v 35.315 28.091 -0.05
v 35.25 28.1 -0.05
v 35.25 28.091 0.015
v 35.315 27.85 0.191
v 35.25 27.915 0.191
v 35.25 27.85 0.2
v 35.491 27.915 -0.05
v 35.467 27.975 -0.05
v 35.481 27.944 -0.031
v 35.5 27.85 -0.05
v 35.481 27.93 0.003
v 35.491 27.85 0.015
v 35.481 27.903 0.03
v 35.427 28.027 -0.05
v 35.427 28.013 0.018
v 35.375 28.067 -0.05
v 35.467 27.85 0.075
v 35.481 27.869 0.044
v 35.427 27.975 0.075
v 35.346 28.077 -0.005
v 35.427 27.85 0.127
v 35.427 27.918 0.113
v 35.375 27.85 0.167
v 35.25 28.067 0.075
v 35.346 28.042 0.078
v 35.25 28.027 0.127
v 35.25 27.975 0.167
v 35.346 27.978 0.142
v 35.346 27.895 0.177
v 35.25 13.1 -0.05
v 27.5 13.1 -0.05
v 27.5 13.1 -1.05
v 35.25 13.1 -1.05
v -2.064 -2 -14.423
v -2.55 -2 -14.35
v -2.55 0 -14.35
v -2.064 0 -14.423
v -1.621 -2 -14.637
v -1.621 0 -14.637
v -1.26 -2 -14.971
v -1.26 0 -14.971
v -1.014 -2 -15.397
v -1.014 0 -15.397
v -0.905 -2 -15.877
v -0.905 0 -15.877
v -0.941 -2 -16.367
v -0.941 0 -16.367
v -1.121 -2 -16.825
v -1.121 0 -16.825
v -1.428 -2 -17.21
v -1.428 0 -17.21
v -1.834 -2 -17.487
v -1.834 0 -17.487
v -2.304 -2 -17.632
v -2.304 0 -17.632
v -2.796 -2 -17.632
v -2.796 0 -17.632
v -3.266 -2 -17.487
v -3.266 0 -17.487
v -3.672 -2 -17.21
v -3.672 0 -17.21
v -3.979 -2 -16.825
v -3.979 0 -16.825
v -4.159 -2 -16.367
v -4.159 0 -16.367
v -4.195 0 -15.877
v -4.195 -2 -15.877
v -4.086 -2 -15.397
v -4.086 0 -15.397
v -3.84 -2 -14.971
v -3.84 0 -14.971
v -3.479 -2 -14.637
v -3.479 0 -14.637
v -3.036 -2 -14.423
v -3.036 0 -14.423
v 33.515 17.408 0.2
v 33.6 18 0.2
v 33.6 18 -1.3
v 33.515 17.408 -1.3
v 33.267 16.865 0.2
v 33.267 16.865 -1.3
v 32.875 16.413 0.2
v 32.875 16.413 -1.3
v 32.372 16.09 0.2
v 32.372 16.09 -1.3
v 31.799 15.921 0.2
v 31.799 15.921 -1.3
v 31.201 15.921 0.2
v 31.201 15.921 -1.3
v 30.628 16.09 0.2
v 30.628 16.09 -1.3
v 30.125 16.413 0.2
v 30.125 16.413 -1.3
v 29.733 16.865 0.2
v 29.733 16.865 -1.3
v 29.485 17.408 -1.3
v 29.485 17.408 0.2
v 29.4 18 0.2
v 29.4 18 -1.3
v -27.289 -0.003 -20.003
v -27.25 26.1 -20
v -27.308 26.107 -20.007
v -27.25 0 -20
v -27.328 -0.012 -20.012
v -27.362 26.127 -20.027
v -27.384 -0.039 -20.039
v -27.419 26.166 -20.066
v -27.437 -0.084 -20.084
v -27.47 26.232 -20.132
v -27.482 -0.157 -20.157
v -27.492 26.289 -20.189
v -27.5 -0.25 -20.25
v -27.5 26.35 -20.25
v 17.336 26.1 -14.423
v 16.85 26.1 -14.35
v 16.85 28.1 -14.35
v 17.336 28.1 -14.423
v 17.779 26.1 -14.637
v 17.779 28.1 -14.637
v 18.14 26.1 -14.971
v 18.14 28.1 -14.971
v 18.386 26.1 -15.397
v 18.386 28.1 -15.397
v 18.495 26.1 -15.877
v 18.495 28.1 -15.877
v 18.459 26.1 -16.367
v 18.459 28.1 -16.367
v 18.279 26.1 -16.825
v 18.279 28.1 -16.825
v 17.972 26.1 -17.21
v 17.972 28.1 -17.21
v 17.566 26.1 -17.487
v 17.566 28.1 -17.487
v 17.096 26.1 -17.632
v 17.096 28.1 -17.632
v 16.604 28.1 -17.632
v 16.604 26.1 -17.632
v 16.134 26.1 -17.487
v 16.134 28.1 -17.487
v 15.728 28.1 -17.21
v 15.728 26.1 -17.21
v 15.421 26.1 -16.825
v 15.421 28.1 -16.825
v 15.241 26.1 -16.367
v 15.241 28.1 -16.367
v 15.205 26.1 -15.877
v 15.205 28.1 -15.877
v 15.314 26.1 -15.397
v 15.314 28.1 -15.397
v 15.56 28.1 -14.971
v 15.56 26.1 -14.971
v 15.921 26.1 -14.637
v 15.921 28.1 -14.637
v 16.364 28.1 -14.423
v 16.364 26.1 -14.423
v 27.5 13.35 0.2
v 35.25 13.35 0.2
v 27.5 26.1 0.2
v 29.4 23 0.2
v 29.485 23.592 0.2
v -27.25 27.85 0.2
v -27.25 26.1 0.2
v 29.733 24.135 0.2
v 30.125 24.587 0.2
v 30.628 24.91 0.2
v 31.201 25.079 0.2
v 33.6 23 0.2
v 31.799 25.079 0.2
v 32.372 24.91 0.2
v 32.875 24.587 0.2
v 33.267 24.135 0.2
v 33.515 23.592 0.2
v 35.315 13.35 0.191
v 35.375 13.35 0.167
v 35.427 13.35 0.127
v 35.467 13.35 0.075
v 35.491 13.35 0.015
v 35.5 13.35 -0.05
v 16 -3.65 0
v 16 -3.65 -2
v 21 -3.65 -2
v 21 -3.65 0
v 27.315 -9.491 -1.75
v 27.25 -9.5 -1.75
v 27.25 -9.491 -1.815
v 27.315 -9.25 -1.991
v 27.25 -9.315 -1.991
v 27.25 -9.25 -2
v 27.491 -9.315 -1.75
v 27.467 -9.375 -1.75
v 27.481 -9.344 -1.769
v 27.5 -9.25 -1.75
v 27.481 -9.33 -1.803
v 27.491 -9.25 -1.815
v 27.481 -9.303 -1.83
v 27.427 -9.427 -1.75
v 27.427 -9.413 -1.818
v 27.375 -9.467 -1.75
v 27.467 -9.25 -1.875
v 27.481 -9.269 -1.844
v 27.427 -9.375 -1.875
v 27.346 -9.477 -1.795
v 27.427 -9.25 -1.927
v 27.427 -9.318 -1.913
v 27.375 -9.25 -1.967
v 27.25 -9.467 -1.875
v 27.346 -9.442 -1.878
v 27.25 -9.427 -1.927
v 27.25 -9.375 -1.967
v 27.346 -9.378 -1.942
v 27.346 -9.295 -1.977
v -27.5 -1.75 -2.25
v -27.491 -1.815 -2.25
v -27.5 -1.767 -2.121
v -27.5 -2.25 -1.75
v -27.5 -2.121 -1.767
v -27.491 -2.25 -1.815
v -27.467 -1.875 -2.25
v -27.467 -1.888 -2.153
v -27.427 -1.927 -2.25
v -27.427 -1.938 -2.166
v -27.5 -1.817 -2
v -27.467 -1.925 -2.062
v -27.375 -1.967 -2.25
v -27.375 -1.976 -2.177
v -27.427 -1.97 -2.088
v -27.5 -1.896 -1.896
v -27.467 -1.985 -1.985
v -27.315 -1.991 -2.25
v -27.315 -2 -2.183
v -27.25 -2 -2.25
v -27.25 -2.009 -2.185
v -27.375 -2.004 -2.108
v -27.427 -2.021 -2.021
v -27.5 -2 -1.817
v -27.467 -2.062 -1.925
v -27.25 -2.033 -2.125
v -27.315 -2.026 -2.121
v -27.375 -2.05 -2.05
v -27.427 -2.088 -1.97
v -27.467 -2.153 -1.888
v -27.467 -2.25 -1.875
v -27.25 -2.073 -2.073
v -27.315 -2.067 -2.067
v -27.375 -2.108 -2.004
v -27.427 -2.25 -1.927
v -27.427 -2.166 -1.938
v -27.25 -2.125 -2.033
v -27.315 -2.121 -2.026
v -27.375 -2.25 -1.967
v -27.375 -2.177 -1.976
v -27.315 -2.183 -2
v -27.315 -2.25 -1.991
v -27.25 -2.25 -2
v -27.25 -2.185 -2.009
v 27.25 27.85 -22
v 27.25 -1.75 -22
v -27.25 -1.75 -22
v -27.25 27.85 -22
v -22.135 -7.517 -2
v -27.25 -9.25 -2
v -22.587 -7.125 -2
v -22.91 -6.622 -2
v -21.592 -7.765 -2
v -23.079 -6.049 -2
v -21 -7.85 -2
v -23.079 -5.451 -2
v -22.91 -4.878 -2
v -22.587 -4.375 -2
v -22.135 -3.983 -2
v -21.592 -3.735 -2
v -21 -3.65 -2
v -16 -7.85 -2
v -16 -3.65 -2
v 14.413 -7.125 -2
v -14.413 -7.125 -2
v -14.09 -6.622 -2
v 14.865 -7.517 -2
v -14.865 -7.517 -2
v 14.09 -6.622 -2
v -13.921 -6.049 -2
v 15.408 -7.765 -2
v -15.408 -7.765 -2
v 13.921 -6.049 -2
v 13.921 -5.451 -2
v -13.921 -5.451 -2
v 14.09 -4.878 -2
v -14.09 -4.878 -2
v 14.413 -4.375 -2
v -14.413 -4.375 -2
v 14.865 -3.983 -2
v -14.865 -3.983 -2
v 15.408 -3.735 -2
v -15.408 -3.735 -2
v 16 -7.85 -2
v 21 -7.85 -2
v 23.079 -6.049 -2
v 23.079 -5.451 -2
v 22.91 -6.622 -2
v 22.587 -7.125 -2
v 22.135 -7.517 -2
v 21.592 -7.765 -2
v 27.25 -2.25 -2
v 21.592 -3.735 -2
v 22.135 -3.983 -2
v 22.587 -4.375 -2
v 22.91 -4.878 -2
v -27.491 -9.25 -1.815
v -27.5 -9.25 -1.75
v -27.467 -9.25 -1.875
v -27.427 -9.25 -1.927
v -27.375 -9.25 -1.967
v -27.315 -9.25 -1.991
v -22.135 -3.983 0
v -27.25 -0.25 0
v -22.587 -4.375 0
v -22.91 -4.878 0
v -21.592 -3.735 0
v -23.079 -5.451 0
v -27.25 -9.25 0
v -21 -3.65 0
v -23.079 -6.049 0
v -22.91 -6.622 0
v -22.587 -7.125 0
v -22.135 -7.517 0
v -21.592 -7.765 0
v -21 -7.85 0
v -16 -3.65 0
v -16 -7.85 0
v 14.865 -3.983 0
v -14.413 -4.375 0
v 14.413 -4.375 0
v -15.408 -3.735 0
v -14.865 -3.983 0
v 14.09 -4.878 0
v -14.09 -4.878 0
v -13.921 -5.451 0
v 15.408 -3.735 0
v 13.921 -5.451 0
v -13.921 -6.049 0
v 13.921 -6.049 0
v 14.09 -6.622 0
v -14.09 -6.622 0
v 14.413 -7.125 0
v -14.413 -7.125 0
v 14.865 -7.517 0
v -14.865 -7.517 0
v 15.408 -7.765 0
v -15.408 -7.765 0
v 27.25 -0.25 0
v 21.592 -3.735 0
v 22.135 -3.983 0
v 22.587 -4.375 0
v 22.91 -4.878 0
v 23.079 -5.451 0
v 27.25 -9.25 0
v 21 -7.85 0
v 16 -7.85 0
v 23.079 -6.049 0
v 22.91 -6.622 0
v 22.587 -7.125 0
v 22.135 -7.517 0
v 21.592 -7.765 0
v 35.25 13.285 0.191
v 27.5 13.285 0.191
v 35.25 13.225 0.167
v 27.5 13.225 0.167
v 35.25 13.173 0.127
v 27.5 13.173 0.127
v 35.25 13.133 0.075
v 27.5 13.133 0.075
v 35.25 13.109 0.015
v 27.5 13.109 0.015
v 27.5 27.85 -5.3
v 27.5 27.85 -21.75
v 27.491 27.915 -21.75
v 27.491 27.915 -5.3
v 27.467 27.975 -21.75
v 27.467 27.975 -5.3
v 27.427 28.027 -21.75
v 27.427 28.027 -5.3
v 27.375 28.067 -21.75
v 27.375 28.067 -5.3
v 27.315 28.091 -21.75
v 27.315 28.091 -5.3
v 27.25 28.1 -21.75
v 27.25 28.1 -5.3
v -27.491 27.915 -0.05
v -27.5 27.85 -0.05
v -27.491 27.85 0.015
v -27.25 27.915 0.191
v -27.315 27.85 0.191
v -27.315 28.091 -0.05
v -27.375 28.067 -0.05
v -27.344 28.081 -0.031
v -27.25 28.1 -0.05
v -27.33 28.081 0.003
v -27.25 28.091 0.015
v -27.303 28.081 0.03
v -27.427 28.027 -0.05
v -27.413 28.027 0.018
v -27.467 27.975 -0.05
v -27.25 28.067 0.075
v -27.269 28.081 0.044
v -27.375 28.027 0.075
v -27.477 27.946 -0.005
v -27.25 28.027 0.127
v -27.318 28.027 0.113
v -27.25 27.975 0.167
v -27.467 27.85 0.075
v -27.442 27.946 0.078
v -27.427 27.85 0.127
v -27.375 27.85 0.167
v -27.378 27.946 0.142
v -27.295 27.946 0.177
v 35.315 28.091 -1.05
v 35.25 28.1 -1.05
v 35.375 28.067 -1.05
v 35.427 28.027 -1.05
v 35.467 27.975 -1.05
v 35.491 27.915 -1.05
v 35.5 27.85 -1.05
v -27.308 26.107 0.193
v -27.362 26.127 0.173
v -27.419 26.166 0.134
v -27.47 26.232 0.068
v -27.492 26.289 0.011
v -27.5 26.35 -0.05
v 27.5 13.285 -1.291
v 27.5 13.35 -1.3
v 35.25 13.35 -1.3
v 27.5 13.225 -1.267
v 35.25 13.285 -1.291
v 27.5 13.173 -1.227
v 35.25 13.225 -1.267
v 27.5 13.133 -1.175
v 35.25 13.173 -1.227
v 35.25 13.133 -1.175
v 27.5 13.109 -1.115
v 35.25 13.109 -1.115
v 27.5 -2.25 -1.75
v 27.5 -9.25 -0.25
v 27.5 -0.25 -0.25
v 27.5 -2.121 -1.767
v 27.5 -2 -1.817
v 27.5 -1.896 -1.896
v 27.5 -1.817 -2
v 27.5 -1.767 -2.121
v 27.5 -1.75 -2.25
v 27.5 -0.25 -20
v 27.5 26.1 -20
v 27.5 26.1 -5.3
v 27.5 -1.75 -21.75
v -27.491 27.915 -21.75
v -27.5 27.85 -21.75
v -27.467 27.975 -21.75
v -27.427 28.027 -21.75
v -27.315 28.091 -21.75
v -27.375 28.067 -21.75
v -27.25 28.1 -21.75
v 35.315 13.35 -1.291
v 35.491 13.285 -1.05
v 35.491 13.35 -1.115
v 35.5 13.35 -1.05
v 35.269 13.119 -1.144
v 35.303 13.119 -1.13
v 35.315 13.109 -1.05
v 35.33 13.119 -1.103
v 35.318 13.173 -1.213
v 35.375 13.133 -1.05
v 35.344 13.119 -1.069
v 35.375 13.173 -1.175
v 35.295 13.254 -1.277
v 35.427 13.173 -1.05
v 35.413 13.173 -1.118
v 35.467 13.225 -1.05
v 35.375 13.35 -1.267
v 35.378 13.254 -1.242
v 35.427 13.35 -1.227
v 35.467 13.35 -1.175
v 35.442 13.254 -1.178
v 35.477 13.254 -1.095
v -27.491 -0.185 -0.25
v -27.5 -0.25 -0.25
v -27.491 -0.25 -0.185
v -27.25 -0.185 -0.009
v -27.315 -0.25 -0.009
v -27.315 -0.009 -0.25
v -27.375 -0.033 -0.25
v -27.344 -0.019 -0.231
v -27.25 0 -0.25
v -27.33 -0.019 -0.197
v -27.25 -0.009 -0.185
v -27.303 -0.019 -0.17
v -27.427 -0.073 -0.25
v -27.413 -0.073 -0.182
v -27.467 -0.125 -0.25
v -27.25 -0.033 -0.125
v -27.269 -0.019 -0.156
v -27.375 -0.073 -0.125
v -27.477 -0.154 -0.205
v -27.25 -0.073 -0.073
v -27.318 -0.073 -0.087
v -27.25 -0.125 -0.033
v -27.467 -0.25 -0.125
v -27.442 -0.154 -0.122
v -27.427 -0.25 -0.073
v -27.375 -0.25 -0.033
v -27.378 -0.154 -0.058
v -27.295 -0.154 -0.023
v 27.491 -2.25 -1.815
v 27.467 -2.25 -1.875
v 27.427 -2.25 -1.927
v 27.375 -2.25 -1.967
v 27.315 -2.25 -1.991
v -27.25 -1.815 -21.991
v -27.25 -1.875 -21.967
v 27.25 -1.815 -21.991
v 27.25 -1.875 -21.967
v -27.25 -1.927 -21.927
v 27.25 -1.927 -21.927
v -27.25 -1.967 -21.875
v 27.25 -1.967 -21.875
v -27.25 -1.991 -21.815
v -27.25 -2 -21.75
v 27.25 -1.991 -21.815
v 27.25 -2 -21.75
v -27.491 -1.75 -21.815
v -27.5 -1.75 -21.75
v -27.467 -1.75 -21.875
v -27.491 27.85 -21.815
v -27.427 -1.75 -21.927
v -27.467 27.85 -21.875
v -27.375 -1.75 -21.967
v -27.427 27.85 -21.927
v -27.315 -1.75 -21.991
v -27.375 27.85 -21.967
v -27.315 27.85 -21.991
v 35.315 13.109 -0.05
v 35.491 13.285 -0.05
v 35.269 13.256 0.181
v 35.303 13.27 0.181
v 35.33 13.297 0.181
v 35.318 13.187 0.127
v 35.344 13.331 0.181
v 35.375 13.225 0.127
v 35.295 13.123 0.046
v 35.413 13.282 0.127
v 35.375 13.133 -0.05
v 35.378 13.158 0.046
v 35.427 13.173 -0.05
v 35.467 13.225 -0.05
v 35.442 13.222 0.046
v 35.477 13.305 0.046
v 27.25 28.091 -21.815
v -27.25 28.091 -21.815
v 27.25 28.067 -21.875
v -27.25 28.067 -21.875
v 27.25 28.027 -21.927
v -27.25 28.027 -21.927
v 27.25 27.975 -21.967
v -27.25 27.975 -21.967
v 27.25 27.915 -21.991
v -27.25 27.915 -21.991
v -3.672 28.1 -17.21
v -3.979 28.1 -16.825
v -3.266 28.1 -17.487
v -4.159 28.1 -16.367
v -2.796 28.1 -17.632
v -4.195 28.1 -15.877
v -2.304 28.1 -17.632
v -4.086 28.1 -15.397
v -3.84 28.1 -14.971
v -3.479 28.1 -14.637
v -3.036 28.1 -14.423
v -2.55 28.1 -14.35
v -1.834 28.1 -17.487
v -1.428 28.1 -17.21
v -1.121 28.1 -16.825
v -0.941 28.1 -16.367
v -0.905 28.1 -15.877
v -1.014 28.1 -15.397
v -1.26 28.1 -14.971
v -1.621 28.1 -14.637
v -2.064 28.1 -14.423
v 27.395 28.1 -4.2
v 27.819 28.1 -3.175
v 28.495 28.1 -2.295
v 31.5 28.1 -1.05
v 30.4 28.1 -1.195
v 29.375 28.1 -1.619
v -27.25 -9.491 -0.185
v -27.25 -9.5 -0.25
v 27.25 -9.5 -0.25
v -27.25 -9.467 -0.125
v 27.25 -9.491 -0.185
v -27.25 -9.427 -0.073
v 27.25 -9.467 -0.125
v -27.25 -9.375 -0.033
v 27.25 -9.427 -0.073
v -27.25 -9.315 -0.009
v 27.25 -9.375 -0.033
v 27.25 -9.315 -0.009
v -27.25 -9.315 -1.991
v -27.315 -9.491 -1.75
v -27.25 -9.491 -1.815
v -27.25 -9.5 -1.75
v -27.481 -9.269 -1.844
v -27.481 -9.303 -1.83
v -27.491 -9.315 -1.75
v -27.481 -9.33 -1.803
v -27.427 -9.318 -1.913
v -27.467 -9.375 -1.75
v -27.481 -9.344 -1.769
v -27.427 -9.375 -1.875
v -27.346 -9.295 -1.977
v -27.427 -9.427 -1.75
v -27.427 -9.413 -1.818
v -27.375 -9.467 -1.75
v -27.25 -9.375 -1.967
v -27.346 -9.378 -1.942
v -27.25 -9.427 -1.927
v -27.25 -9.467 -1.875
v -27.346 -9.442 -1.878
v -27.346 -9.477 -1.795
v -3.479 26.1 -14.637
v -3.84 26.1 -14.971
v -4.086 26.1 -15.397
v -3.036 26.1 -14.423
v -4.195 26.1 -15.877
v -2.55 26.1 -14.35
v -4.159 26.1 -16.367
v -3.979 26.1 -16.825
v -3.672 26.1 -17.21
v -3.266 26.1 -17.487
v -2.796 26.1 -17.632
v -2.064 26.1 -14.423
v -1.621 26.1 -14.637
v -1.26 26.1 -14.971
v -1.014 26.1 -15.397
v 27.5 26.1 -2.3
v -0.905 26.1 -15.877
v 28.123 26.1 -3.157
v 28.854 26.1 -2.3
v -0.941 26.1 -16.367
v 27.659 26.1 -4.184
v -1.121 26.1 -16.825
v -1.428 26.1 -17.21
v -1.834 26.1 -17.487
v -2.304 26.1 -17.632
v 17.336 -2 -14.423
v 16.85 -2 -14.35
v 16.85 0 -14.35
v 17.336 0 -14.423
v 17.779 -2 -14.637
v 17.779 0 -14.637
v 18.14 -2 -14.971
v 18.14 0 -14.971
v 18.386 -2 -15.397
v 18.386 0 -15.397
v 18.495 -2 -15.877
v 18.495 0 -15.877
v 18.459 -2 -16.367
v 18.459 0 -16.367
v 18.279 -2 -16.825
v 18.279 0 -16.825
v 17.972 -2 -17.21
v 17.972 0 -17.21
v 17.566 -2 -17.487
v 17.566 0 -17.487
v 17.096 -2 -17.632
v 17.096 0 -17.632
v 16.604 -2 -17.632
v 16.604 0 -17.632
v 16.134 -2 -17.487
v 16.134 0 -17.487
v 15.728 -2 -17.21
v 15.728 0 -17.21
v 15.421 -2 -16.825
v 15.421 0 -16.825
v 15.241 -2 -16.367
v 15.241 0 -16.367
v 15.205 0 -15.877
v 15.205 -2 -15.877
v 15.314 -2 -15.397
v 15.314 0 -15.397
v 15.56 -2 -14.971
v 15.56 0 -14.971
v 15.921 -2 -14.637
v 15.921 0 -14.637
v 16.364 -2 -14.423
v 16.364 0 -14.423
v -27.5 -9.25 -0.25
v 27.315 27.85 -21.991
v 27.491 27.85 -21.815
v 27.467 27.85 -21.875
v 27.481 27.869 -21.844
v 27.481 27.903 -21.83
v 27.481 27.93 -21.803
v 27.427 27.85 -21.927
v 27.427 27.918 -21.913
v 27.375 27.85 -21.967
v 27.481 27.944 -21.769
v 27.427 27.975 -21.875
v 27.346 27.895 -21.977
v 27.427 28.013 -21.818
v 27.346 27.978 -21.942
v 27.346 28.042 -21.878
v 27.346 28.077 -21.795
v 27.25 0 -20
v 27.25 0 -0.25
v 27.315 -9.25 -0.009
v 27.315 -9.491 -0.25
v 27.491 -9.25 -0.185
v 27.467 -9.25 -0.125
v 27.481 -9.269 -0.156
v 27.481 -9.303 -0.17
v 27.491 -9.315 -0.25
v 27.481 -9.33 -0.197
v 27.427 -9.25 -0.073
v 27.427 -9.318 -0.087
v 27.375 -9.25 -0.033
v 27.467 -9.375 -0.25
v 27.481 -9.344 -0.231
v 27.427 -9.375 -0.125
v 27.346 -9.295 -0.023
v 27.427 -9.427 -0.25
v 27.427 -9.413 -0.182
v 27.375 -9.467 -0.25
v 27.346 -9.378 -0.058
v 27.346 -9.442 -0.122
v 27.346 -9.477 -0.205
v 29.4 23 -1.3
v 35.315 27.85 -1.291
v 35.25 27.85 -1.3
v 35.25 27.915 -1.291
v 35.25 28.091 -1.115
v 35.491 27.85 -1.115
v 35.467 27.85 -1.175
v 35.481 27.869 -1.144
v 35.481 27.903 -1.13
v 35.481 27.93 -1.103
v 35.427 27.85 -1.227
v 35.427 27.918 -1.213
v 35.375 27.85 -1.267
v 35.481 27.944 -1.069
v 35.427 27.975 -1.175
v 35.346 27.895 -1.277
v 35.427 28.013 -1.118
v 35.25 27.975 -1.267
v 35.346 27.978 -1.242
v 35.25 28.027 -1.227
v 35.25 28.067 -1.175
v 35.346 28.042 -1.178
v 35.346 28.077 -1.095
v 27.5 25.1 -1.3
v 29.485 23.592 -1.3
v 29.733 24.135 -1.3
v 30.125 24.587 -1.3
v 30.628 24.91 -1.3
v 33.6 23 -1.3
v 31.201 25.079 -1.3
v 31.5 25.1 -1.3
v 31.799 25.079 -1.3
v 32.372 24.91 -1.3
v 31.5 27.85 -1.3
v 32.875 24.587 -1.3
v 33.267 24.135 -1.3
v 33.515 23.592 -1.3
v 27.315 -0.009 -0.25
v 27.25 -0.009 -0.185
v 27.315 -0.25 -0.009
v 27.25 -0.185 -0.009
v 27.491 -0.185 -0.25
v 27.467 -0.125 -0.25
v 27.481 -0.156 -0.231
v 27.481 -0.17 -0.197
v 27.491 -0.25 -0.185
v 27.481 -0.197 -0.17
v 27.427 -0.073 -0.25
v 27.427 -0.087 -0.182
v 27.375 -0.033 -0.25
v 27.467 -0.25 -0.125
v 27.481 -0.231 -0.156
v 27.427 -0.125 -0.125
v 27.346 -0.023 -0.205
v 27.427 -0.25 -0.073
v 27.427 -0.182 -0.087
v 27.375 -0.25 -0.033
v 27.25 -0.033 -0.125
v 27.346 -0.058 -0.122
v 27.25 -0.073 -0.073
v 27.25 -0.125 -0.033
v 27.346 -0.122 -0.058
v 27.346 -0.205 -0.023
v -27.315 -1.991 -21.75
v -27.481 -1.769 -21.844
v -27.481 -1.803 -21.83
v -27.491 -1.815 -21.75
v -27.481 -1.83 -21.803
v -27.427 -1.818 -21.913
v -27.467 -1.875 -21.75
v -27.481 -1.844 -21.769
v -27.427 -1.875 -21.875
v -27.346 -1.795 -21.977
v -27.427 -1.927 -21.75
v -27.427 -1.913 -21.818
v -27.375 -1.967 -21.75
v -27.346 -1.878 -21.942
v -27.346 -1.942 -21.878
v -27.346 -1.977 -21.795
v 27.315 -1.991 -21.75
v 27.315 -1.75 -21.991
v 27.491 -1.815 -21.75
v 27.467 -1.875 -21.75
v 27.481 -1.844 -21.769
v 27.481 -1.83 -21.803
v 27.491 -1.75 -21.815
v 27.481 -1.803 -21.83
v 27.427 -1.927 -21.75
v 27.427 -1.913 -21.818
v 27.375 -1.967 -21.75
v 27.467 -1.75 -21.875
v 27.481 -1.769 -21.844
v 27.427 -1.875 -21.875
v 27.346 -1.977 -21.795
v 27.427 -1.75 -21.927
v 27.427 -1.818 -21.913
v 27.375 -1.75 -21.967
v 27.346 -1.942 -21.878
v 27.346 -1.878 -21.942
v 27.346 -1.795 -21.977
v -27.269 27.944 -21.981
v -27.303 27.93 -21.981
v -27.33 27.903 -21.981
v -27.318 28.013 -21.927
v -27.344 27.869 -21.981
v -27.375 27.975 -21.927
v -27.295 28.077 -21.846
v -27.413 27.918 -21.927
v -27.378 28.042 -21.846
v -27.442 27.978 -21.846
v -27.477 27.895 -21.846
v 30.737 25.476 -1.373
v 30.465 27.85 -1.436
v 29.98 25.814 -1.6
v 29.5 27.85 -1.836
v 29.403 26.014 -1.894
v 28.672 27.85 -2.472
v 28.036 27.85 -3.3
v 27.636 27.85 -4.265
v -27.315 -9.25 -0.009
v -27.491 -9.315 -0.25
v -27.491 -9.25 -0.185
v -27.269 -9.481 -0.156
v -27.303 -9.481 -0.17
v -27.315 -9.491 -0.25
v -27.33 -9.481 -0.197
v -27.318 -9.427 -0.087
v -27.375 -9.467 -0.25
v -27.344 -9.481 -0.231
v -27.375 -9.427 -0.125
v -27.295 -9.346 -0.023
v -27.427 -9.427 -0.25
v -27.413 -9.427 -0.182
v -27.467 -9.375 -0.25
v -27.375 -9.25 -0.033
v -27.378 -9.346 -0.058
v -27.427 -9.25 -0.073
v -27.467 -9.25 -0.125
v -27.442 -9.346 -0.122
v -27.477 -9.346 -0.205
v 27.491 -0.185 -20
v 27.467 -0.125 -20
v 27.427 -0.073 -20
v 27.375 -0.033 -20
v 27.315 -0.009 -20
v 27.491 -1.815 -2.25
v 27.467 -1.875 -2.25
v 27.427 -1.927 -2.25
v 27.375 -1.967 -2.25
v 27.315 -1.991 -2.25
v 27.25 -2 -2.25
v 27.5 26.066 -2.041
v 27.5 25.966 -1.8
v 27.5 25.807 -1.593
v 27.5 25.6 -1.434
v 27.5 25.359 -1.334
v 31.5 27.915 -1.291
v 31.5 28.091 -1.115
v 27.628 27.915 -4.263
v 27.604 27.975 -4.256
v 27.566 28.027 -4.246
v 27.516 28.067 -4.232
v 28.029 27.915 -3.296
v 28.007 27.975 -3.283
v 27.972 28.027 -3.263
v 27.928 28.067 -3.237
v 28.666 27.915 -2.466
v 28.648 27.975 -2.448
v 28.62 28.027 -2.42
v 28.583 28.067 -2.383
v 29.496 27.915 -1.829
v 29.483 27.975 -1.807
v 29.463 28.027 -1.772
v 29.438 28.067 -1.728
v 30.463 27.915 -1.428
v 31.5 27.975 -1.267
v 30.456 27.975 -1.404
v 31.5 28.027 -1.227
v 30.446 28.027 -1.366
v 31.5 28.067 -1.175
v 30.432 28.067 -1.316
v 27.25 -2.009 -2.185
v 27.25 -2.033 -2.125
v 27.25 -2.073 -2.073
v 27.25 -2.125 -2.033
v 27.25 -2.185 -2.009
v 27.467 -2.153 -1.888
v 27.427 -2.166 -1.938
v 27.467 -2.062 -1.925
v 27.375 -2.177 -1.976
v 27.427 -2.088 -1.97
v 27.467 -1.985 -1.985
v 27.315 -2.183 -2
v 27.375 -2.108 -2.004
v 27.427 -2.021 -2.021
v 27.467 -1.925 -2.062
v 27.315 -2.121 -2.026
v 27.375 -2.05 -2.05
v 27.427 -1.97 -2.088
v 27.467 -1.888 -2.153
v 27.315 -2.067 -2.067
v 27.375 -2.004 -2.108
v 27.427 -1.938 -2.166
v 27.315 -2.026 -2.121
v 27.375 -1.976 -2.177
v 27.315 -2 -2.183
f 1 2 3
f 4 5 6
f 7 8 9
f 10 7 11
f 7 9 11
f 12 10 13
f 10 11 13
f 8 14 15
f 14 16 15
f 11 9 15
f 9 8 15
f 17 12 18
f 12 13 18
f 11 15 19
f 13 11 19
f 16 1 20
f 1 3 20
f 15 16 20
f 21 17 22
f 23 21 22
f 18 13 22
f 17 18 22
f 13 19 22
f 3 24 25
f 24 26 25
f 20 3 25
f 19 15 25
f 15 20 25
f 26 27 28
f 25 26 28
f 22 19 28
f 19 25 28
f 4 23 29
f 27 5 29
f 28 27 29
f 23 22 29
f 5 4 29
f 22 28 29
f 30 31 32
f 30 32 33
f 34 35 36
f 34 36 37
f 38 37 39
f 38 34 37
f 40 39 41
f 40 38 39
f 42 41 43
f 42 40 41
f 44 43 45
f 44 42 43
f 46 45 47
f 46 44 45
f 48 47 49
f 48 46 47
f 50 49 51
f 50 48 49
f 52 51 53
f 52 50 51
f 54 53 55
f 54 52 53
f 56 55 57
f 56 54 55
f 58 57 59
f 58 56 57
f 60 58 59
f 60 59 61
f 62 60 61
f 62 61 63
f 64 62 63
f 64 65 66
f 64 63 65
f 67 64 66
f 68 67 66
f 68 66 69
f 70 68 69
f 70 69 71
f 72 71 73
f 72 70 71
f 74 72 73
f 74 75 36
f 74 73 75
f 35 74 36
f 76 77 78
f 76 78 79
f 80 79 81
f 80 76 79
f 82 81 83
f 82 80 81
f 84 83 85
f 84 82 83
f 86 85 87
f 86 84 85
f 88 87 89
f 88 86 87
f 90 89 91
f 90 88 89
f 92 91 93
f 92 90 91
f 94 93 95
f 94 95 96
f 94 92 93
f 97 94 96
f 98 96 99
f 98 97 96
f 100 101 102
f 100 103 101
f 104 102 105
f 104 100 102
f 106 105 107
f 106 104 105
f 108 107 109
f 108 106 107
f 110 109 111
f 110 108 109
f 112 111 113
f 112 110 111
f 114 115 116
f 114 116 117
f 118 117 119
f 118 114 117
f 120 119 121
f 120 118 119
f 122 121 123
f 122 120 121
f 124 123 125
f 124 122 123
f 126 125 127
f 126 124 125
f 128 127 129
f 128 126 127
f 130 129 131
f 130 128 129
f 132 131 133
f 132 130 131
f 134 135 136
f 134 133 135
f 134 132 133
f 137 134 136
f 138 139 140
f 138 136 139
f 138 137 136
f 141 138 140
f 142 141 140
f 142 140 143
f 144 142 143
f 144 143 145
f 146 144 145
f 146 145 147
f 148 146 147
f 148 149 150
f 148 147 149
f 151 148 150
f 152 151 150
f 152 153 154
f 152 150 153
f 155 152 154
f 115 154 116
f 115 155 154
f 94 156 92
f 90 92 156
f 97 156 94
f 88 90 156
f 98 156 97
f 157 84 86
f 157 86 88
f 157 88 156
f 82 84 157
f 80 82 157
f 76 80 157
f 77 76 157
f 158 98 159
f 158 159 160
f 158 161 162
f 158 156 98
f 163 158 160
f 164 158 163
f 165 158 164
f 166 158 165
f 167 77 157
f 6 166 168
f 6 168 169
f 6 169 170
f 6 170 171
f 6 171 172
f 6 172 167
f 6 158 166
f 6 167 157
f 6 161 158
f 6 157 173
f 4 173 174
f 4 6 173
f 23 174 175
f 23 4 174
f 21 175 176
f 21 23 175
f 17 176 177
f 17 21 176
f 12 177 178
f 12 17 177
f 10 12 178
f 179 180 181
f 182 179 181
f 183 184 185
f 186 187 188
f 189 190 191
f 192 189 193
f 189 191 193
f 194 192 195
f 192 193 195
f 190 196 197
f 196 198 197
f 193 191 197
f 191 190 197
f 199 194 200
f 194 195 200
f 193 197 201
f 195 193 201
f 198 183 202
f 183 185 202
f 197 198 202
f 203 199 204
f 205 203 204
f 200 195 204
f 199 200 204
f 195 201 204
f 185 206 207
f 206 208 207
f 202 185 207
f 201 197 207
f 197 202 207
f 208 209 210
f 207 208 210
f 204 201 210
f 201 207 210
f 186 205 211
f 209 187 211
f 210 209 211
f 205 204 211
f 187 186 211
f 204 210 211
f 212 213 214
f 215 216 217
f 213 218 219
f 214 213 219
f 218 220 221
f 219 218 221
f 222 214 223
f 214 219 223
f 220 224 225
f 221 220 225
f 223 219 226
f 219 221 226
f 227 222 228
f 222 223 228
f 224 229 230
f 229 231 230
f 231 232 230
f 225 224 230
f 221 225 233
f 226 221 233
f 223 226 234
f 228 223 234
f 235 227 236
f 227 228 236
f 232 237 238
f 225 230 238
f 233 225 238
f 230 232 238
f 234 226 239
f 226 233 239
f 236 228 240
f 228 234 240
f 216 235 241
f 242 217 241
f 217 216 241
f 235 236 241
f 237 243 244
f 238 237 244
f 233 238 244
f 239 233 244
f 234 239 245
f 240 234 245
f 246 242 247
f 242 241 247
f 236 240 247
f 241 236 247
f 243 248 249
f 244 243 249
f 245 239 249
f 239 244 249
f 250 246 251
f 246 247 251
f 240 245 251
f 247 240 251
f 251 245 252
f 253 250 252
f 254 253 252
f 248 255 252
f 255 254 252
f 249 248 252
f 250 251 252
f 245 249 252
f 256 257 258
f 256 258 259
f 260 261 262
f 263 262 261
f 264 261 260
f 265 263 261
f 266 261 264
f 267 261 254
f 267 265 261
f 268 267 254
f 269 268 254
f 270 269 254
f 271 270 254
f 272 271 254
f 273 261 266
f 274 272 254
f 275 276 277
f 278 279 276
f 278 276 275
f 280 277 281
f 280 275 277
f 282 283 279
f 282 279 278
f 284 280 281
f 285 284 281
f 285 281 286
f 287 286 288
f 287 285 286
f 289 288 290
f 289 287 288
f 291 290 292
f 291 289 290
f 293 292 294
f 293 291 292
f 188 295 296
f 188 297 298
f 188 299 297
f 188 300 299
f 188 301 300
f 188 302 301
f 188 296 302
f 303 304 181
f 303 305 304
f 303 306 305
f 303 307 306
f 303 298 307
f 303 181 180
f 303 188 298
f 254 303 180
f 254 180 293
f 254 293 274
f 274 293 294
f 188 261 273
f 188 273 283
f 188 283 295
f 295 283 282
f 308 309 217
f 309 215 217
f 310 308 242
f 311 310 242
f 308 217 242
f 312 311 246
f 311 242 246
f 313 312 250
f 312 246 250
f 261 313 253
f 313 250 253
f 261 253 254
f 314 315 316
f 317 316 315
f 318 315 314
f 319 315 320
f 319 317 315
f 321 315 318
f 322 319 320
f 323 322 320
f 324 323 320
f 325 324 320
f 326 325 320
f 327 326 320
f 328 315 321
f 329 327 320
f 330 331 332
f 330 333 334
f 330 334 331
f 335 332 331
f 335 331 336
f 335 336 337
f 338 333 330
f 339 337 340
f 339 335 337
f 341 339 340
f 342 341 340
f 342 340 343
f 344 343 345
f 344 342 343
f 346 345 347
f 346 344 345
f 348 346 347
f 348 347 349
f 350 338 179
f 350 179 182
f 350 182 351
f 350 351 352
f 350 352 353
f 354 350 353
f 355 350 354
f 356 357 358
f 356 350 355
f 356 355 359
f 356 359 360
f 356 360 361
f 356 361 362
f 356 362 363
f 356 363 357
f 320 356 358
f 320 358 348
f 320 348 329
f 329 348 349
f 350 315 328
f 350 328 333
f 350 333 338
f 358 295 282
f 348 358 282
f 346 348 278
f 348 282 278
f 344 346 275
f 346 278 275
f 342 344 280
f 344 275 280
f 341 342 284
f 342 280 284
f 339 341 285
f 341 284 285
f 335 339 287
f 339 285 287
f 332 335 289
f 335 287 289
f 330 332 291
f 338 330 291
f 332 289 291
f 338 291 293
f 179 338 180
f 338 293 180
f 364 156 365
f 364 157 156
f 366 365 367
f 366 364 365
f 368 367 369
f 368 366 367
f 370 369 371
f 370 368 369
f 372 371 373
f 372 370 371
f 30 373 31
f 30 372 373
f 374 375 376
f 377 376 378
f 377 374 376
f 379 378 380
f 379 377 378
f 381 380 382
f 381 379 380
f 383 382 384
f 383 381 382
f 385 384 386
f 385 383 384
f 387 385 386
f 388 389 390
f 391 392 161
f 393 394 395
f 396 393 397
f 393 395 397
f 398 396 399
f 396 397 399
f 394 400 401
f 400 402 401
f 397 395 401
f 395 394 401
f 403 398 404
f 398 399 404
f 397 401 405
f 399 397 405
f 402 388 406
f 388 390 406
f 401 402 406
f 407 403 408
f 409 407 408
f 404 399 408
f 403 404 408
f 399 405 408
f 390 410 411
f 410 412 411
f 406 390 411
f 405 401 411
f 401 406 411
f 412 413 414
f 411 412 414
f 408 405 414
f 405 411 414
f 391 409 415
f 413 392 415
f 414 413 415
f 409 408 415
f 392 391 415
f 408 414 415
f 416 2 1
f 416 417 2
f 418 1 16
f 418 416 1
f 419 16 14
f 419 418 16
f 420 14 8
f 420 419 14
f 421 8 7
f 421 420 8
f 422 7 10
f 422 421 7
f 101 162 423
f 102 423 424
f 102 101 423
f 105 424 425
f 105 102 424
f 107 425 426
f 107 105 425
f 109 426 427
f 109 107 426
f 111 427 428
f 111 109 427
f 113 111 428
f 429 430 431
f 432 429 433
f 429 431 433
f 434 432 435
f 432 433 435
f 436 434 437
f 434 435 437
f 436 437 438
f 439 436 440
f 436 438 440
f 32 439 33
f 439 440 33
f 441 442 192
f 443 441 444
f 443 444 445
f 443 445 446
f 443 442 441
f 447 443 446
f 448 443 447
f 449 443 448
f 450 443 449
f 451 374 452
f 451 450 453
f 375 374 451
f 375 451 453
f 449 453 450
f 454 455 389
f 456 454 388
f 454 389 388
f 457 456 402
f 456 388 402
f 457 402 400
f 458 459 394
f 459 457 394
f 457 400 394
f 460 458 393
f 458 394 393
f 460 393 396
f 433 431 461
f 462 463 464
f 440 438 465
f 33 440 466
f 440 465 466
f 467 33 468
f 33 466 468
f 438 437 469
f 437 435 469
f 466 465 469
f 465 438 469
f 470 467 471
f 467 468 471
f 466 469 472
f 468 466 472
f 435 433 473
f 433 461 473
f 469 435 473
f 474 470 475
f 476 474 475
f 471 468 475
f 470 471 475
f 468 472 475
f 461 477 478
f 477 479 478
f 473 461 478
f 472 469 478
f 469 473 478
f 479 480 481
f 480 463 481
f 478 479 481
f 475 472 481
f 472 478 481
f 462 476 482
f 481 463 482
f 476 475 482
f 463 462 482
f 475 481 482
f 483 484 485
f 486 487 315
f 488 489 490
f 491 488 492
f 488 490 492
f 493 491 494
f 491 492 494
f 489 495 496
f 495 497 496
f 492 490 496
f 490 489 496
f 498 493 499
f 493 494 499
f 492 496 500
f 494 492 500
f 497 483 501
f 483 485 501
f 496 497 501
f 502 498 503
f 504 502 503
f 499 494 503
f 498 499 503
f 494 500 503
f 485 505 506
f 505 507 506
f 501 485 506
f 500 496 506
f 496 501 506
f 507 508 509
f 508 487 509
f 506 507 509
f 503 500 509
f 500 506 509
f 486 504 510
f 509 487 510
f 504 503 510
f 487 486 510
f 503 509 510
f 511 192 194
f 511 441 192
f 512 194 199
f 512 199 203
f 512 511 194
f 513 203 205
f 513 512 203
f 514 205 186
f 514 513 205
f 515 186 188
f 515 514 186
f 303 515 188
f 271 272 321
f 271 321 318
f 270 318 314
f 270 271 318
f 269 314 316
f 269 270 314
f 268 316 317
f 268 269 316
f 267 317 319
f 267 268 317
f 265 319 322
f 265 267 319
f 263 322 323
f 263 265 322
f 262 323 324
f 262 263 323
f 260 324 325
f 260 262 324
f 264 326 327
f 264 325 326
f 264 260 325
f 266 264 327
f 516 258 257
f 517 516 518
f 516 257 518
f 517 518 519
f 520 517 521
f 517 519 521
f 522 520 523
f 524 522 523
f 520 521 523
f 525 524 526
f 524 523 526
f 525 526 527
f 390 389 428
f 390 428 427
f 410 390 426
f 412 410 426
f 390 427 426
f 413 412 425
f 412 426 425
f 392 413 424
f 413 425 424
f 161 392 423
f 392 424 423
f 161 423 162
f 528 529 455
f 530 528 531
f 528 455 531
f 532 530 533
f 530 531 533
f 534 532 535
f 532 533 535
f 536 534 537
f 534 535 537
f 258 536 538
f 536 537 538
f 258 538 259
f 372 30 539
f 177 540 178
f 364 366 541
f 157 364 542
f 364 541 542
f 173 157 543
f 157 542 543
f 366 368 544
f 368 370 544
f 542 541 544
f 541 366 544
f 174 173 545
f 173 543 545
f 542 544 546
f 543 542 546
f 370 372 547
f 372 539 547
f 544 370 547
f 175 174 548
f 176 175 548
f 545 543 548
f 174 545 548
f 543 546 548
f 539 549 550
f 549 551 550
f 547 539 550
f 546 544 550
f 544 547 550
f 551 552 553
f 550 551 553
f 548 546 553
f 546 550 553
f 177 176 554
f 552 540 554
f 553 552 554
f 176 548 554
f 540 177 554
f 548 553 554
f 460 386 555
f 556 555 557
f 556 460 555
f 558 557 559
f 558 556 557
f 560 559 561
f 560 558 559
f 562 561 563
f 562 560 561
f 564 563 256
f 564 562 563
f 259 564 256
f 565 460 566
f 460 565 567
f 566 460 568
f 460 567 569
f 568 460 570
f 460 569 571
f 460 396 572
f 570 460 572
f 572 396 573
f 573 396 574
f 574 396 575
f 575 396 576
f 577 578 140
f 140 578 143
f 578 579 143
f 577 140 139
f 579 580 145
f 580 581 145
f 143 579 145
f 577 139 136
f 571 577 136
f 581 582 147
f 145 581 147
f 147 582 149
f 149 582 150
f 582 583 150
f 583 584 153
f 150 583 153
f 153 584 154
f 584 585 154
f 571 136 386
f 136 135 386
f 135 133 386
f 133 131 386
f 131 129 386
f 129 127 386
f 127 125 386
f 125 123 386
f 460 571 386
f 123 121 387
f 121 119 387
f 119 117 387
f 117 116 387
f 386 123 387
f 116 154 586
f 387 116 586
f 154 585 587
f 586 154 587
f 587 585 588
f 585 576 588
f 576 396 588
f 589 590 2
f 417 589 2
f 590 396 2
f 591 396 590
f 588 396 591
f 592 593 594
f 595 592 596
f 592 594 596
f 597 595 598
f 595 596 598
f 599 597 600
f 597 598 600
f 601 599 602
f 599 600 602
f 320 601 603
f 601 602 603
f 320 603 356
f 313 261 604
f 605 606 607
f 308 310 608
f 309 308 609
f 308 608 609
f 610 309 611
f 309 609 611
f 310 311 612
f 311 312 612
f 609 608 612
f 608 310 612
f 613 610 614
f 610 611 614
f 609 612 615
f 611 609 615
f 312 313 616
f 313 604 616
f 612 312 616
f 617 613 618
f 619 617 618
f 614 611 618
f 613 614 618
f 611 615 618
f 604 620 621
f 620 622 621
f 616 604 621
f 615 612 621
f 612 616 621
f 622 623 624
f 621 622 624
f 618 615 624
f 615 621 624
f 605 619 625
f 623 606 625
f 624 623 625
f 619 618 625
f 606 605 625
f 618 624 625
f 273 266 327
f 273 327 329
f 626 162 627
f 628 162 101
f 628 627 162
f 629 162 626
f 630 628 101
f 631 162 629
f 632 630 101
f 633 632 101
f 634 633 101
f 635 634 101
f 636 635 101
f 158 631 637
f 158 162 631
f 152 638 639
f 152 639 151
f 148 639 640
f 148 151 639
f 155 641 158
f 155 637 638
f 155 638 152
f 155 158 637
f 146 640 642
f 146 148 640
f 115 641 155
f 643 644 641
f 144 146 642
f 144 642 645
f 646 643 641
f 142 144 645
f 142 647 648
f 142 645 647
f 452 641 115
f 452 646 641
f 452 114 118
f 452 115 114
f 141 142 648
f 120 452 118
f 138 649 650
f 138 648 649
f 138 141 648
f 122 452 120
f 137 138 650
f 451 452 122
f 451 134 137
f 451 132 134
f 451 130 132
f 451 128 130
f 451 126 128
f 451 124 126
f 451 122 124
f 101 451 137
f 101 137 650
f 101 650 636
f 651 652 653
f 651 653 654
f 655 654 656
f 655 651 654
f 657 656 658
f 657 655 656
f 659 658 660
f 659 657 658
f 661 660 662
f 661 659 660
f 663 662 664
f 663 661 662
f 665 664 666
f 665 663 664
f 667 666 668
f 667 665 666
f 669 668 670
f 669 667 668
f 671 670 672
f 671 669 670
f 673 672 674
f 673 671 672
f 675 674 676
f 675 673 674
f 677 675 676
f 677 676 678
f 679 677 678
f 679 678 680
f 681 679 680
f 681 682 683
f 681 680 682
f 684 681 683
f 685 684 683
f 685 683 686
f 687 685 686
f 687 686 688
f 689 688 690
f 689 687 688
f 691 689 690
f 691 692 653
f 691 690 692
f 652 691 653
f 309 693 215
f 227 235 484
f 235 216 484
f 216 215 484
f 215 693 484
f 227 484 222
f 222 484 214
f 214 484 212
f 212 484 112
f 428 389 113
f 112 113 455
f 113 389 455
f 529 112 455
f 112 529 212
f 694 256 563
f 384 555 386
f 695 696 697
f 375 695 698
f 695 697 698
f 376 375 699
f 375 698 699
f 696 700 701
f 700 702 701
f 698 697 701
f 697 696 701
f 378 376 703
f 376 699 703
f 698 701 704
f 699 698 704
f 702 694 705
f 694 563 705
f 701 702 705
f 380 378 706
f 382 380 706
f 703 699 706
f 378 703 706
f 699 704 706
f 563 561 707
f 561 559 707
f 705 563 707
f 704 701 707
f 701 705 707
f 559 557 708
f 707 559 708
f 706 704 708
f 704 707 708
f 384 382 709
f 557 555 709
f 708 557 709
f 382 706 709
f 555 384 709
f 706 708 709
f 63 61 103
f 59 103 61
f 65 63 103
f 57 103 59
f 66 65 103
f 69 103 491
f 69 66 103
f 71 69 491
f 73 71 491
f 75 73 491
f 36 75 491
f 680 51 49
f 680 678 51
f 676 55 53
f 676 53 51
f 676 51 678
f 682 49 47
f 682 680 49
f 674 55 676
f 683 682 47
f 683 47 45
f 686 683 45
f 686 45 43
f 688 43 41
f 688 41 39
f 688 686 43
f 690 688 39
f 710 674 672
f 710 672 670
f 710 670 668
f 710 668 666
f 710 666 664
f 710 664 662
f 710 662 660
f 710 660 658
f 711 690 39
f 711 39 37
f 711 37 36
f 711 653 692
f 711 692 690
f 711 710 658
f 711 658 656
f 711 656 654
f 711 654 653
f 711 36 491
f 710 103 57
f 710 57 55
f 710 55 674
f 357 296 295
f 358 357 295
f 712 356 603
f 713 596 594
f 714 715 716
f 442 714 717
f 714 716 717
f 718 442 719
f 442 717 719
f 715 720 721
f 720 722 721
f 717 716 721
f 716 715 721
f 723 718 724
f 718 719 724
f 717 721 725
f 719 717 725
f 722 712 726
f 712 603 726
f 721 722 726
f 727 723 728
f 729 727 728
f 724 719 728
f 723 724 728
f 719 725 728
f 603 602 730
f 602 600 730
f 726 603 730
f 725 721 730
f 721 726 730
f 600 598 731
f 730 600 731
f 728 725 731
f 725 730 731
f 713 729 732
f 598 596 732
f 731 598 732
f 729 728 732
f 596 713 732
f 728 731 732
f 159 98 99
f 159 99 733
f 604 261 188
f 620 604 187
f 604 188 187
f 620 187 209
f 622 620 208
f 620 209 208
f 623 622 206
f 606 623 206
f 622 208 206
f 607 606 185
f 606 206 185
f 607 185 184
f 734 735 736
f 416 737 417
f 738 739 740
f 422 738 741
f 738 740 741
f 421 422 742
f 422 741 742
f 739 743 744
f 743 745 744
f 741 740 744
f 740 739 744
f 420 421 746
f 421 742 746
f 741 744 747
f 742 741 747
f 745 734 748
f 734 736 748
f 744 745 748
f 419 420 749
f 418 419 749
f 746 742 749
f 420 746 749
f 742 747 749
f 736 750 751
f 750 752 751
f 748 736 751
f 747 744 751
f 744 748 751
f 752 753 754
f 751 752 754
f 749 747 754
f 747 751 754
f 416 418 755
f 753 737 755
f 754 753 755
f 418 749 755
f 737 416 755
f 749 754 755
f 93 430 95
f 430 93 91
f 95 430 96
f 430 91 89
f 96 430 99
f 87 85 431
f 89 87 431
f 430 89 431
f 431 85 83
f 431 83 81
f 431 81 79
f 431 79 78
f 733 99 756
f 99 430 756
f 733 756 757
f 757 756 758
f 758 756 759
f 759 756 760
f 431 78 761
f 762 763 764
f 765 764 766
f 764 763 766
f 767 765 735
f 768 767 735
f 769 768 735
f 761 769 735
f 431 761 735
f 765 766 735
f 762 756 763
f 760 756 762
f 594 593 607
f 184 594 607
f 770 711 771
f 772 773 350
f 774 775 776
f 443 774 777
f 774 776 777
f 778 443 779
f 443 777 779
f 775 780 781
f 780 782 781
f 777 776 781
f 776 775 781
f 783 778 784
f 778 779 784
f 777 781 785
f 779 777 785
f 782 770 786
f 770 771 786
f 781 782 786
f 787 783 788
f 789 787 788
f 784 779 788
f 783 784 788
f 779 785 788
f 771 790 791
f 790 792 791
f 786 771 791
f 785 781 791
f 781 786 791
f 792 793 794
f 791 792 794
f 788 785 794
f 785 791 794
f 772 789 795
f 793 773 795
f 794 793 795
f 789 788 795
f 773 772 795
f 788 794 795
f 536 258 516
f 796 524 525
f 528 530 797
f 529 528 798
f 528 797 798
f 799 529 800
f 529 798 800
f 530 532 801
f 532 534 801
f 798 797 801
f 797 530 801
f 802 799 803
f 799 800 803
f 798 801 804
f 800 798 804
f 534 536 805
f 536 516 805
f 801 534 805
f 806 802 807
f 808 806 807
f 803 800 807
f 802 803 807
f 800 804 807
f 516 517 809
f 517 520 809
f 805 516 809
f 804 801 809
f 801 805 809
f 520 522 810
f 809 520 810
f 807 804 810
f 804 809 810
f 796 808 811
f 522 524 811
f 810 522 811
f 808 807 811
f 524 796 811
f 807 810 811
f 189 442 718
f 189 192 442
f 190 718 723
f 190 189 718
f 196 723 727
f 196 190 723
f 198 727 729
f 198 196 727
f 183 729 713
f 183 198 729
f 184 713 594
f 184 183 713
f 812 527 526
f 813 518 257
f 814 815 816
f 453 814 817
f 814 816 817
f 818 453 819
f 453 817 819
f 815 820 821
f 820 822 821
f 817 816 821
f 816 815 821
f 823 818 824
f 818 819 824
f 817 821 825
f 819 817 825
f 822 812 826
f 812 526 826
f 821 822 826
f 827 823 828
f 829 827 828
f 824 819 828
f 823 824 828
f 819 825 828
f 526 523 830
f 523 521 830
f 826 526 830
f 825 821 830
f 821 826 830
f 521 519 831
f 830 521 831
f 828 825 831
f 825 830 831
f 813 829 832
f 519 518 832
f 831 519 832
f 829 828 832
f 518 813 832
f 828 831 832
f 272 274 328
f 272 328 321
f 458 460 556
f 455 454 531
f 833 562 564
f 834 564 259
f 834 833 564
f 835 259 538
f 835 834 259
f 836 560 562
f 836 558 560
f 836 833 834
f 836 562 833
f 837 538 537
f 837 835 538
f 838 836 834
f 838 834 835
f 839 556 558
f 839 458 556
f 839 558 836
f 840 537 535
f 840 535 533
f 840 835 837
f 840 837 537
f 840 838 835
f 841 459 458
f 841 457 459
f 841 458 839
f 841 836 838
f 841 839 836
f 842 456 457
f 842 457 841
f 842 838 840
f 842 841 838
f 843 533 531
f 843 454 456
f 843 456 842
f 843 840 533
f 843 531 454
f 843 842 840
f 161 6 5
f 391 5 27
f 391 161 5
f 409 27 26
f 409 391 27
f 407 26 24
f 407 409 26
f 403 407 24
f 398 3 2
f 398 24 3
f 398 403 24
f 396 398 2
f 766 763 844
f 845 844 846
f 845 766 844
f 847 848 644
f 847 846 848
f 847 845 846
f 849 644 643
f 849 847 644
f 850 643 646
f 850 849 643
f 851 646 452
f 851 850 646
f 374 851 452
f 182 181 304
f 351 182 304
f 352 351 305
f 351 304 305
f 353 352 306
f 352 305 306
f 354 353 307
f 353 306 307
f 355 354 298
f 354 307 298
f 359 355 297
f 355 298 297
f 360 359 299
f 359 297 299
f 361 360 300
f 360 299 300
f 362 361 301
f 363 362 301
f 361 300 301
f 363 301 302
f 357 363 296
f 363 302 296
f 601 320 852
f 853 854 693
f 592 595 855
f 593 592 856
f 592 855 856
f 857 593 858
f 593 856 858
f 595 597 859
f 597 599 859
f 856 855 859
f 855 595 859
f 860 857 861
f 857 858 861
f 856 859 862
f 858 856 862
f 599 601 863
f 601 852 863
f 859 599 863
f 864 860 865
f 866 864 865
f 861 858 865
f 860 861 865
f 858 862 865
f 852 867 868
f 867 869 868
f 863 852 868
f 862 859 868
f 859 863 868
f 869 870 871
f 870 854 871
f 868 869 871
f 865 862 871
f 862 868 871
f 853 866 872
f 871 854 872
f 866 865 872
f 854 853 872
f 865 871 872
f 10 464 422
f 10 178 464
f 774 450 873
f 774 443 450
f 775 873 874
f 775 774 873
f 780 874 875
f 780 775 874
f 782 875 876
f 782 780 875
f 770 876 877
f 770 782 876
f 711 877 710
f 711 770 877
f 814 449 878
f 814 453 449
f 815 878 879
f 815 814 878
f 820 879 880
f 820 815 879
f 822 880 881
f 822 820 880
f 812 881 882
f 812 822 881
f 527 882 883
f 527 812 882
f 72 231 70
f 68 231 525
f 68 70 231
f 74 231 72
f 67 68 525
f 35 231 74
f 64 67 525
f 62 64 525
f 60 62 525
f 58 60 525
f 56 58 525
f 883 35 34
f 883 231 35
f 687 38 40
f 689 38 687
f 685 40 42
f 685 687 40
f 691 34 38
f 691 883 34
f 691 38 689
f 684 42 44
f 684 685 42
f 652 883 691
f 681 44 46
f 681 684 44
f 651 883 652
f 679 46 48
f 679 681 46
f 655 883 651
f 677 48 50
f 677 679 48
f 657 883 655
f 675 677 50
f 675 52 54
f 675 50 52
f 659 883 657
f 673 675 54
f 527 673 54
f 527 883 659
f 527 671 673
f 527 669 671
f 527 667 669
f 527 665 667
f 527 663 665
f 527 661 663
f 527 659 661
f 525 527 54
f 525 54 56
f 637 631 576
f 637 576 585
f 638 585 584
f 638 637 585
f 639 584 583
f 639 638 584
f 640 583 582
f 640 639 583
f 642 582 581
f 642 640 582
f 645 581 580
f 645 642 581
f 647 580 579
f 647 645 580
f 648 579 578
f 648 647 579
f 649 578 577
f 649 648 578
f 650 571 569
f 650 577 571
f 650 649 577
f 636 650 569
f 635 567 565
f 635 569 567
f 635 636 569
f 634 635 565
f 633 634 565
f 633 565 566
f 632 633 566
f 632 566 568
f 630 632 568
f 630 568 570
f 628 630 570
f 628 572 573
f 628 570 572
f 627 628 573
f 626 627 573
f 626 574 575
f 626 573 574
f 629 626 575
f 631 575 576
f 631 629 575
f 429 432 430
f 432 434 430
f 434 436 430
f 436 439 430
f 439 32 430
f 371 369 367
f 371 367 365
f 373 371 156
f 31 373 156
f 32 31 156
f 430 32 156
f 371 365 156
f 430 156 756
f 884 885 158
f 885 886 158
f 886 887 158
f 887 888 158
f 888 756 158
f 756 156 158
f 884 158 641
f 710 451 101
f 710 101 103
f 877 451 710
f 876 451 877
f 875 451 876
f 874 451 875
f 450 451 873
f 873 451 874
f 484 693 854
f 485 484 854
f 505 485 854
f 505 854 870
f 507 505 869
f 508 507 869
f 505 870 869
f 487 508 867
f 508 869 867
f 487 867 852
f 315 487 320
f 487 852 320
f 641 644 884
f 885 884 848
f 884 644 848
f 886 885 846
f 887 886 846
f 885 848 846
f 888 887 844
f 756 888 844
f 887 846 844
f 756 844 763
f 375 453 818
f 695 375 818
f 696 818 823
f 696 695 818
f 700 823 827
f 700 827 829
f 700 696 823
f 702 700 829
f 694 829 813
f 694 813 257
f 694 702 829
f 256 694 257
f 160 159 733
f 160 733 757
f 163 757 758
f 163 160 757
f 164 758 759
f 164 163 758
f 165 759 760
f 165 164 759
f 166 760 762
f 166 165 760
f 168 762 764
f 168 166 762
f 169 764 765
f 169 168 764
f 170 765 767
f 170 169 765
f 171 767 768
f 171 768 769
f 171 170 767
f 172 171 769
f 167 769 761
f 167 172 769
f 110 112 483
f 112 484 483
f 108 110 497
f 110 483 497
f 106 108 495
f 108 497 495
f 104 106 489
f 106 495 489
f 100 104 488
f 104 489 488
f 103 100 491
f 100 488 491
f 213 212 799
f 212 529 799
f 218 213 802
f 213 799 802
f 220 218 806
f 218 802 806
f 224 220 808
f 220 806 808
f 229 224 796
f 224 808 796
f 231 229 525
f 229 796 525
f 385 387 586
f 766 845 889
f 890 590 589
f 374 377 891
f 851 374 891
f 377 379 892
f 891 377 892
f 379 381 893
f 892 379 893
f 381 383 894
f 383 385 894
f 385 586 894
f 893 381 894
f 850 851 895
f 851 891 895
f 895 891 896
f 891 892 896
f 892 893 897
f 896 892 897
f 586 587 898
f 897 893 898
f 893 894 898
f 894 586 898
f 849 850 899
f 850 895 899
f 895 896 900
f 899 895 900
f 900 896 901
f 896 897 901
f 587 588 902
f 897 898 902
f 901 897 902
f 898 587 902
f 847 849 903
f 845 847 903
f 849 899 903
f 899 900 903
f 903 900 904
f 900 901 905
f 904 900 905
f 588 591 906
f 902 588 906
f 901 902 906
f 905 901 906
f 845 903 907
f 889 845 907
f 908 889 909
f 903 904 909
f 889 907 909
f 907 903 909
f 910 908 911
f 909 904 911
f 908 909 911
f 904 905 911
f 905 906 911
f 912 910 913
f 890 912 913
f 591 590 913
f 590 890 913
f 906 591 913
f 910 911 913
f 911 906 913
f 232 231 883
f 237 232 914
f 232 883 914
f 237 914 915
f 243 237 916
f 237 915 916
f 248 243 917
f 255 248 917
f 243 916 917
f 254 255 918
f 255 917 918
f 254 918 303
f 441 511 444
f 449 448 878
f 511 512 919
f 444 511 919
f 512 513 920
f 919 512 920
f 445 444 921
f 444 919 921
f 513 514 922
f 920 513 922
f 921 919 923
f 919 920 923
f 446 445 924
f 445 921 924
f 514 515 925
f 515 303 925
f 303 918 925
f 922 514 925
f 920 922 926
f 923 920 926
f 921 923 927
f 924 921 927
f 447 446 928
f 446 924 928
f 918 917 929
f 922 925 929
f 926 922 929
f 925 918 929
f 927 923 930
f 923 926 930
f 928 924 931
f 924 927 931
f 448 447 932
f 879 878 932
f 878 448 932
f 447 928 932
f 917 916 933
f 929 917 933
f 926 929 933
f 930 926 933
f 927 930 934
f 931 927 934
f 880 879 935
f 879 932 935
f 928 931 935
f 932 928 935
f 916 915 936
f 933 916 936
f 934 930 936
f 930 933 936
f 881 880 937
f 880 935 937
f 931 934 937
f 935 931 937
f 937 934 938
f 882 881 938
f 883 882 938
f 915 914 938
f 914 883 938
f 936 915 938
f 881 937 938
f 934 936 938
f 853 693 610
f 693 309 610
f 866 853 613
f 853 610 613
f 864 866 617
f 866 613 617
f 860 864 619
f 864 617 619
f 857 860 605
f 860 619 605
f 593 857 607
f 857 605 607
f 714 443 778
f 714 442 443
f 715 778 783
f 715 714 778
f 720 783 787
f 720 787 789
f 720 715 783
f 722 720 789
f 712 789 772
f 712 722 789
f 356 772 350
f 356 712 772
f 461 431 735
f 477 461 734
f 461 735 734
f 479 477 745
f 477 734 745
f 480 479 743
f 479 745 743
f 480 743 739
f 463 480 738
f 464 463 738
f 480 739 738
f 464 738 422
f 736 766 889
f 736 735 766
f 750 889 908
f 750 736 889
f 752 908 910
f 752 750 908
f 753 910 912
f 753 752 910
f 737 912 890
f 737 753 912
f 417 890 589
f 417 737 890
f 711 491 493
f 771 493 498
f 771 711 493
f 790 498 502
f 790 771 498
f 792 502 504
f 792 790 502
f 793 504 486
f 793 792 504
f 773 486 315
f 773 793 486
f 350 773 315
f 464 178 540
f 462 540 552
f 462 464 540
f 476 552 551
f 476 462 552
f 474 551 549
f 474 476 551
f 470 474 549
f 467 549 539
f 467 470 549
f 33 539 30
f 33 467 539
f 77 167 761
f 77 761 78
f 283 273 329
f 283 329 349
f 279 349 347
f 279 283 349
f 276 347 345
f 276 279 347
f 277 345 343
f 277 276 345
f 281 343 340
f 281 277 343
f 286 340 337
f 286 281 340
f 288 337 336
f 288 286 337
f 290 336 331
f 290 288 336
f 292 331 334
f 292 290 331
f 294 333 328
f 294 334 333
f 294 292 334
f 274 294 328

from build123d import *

# Parameters (mm, degrees)
EXTRUDE_THIN2_DEPTH     = 27.5
CUT_EXTRUDE4_DEPTH      = 46.053967639
CUT_EXTRUDE4_DEPTH_BACK = 46.053967639
SKETCH6_R               = 1.65
SKETCH8_W               = 8
SKETCH8_H               = 15
BOSS_EXTRUDE1_DEPTH     = 1.5
CUT_EXTRUDE5_DEPTH      = 1.5
FILLET2_R               = 4
FILLET3_R               = 0.25
CUT_EXTRUDE7_DEPTH      = 10
FILLET5_R               = 1


with BuildPart() as part:
    # Sketch1 → Extrude-Thin2 (new, symmetric)
    with BuildSketch(Plane(origin=(0, 0, 0), x_dir=(0, 0, -1), z_dir=(1, 0, 0))):
        Polygon((-0.2, 26.1), (20, 26.1), (20, 0), (0, 0), (0, -9.5), (2, -9.5), (2, -2), (22, -2), (22, 28.1), (-0.2, 28.1), align=None)
    extrude(amount=EXTRUDE_THIN2_DEPTH, both=True)

    # Sketch6 → Cut-Extrude4 (cut, two sides: drawn at the far end of the back side and taken through both)
    with BuildSketch(Plane(origin=(0, 0, 0), x_dir=(1, 0, 0), z_dir=(0, 1, 0)).offset(-CUT_EXTRUDE4_DEPTH_BACK)):
        with Locations(Location((-2.55, 16, 0), (0, 0, 270))):
            Circle(SKETCH6_R)
        with Locations(Location((16.85, 16, 0), (0, 0, 270))):
            Circle(SKETCH6_R)
    extrude(amount=CUT_EXTRUDE4_DEPTH + CUT_EXTRUDE4_DEPTH_BACK, mode=Mode.SUBTRACT)

    # Sketch8 → Boss-Extrude1 (add)
    with BuildSketch(Plane.XY.offset(0.2)):
        with Locations((31.5, 20.6)):
            Rectangle(SKETCH8_W, SKETCH8_H)
    extrude(amount=-BOSS_EXTRUDE1_DEPTH)

    # Sketch9 → Cut-Extrude5 (cut)
    with BuildSketch(Plane(origin=(0, 0, 0.2), x_dir=(-1, 0, 0), z_dir=(0, 0, -1))):
        with BuildLine():
            Line((-29.4, 18), (-29.4, 23))
            ThreePointArc((-29.4, 23), (-31.5, 25.1), (-33.6, 23))
            Line((-33.6, 23), (-33.6, 18))
            ThreePointArc((-33.6, 18), (-31.5, 15.9), (-29.4, 18))
        make_face()
    extrude(amount=CUT_EXTRUDE5_DEPTH, mode=Mode.SUBTRACT)

    # Fillet2
    fillet2_edges = [part.edges().sort_by_distance(p)[0] for p in [
        (27.5, 27.1, -1.3),
    ]]
    fillet(fillet2_edges, radius=FILLET2_R)

    # Fillet3
    fillet3_edges = [part.edges().sort_by_distance(p)[0] for p in [
        (-27.5, -4.75, 0),
        (-27.5, 0, -10),
        (-27.5, 13.05, -20),
        (-27.5, 26.1, -9.9),
        (-27.5, 27.1, 0.2),
        (-27.5, 28.1, -10.9),
        (0, 28.1, -22),
        (0, -2, -22),
        (0, -2, -2),
        (0, -9.5, -2),
        (0, -9.5, 0),
        (0, 0, 0),
        (4, 28.1, 0.2),
        (27.5, 0, -10),
        (27.5, -4.75, 0),
        (27.5, -9.5, -1),
        (27.5, -5.75, -2),
        (27.5, -2, -12),
        (27.5, 13.05, -22),
        (33.5, 28.1, -1.3),
        (35.5, 20.6, -1.3),
        (35.5, 28.1, -0.55),
        (31.5, 13.1, -1.3),
        (35.5, 13.1, -0.55),
        (31.5, 13.1, 0.2),
        (35.5, 20.6, 0.2),
        (27.5, 28.1, -13.65),
        (28.671572875, 28.1, -2.471572875),
        (-27.5, 13.05, -22),
        (-27.5, -2, -12),
        (-27.5, -5.75, -2),
        (-27.5, -9.5, -1),
    ]]
    fillet(fillet3_edges, radius=FILLET3_R)

    # Sketch11 → Cut-Extrude7 (cut)
    with BuildSketch(Plane(origin=(0, 0, -2), x_dir=(-1, 0, 0), z_dir=(0, 0, -1))):
        with BuildLine():
            Line((-21, -7.85), (-16, -7.85))
            ThreePointArc((-16, -7.85), (-13.9, -5.75), (-16, -3.65))
            Line((-16, -3.65), (-21, -3.65))
            ThreePointArc((-21, -3.65), (-23.1, -5.75), (-21, -7.85))
        make_face()
        with BuildLine():
            Line((16, -3.65), (21, -3.65))
            ThreePointArc((21, -3.65), (23.1, -5.75), (21, -7.85))
            Line((21, -7.85), (16, -7.85))
            ThreePointArc((16, -7.85), (13.9, -5.75), (16, -3.65))
        make_face()
    extrude(amount=-CUT_EXTRUDE7_DEPTH, mode=Mode.SUBTRACT)

    # Fillet5
    fillet5_edges = [part.edges().sort_by_distance(p)[0] for p in [
        (29.5, 26.1, -1.3),
    ]]
    fillet(fillet5_edges, radius=FILLET5_R - 0.0001)  # a hair under: the kernel refuses the full size


solid = part.part
